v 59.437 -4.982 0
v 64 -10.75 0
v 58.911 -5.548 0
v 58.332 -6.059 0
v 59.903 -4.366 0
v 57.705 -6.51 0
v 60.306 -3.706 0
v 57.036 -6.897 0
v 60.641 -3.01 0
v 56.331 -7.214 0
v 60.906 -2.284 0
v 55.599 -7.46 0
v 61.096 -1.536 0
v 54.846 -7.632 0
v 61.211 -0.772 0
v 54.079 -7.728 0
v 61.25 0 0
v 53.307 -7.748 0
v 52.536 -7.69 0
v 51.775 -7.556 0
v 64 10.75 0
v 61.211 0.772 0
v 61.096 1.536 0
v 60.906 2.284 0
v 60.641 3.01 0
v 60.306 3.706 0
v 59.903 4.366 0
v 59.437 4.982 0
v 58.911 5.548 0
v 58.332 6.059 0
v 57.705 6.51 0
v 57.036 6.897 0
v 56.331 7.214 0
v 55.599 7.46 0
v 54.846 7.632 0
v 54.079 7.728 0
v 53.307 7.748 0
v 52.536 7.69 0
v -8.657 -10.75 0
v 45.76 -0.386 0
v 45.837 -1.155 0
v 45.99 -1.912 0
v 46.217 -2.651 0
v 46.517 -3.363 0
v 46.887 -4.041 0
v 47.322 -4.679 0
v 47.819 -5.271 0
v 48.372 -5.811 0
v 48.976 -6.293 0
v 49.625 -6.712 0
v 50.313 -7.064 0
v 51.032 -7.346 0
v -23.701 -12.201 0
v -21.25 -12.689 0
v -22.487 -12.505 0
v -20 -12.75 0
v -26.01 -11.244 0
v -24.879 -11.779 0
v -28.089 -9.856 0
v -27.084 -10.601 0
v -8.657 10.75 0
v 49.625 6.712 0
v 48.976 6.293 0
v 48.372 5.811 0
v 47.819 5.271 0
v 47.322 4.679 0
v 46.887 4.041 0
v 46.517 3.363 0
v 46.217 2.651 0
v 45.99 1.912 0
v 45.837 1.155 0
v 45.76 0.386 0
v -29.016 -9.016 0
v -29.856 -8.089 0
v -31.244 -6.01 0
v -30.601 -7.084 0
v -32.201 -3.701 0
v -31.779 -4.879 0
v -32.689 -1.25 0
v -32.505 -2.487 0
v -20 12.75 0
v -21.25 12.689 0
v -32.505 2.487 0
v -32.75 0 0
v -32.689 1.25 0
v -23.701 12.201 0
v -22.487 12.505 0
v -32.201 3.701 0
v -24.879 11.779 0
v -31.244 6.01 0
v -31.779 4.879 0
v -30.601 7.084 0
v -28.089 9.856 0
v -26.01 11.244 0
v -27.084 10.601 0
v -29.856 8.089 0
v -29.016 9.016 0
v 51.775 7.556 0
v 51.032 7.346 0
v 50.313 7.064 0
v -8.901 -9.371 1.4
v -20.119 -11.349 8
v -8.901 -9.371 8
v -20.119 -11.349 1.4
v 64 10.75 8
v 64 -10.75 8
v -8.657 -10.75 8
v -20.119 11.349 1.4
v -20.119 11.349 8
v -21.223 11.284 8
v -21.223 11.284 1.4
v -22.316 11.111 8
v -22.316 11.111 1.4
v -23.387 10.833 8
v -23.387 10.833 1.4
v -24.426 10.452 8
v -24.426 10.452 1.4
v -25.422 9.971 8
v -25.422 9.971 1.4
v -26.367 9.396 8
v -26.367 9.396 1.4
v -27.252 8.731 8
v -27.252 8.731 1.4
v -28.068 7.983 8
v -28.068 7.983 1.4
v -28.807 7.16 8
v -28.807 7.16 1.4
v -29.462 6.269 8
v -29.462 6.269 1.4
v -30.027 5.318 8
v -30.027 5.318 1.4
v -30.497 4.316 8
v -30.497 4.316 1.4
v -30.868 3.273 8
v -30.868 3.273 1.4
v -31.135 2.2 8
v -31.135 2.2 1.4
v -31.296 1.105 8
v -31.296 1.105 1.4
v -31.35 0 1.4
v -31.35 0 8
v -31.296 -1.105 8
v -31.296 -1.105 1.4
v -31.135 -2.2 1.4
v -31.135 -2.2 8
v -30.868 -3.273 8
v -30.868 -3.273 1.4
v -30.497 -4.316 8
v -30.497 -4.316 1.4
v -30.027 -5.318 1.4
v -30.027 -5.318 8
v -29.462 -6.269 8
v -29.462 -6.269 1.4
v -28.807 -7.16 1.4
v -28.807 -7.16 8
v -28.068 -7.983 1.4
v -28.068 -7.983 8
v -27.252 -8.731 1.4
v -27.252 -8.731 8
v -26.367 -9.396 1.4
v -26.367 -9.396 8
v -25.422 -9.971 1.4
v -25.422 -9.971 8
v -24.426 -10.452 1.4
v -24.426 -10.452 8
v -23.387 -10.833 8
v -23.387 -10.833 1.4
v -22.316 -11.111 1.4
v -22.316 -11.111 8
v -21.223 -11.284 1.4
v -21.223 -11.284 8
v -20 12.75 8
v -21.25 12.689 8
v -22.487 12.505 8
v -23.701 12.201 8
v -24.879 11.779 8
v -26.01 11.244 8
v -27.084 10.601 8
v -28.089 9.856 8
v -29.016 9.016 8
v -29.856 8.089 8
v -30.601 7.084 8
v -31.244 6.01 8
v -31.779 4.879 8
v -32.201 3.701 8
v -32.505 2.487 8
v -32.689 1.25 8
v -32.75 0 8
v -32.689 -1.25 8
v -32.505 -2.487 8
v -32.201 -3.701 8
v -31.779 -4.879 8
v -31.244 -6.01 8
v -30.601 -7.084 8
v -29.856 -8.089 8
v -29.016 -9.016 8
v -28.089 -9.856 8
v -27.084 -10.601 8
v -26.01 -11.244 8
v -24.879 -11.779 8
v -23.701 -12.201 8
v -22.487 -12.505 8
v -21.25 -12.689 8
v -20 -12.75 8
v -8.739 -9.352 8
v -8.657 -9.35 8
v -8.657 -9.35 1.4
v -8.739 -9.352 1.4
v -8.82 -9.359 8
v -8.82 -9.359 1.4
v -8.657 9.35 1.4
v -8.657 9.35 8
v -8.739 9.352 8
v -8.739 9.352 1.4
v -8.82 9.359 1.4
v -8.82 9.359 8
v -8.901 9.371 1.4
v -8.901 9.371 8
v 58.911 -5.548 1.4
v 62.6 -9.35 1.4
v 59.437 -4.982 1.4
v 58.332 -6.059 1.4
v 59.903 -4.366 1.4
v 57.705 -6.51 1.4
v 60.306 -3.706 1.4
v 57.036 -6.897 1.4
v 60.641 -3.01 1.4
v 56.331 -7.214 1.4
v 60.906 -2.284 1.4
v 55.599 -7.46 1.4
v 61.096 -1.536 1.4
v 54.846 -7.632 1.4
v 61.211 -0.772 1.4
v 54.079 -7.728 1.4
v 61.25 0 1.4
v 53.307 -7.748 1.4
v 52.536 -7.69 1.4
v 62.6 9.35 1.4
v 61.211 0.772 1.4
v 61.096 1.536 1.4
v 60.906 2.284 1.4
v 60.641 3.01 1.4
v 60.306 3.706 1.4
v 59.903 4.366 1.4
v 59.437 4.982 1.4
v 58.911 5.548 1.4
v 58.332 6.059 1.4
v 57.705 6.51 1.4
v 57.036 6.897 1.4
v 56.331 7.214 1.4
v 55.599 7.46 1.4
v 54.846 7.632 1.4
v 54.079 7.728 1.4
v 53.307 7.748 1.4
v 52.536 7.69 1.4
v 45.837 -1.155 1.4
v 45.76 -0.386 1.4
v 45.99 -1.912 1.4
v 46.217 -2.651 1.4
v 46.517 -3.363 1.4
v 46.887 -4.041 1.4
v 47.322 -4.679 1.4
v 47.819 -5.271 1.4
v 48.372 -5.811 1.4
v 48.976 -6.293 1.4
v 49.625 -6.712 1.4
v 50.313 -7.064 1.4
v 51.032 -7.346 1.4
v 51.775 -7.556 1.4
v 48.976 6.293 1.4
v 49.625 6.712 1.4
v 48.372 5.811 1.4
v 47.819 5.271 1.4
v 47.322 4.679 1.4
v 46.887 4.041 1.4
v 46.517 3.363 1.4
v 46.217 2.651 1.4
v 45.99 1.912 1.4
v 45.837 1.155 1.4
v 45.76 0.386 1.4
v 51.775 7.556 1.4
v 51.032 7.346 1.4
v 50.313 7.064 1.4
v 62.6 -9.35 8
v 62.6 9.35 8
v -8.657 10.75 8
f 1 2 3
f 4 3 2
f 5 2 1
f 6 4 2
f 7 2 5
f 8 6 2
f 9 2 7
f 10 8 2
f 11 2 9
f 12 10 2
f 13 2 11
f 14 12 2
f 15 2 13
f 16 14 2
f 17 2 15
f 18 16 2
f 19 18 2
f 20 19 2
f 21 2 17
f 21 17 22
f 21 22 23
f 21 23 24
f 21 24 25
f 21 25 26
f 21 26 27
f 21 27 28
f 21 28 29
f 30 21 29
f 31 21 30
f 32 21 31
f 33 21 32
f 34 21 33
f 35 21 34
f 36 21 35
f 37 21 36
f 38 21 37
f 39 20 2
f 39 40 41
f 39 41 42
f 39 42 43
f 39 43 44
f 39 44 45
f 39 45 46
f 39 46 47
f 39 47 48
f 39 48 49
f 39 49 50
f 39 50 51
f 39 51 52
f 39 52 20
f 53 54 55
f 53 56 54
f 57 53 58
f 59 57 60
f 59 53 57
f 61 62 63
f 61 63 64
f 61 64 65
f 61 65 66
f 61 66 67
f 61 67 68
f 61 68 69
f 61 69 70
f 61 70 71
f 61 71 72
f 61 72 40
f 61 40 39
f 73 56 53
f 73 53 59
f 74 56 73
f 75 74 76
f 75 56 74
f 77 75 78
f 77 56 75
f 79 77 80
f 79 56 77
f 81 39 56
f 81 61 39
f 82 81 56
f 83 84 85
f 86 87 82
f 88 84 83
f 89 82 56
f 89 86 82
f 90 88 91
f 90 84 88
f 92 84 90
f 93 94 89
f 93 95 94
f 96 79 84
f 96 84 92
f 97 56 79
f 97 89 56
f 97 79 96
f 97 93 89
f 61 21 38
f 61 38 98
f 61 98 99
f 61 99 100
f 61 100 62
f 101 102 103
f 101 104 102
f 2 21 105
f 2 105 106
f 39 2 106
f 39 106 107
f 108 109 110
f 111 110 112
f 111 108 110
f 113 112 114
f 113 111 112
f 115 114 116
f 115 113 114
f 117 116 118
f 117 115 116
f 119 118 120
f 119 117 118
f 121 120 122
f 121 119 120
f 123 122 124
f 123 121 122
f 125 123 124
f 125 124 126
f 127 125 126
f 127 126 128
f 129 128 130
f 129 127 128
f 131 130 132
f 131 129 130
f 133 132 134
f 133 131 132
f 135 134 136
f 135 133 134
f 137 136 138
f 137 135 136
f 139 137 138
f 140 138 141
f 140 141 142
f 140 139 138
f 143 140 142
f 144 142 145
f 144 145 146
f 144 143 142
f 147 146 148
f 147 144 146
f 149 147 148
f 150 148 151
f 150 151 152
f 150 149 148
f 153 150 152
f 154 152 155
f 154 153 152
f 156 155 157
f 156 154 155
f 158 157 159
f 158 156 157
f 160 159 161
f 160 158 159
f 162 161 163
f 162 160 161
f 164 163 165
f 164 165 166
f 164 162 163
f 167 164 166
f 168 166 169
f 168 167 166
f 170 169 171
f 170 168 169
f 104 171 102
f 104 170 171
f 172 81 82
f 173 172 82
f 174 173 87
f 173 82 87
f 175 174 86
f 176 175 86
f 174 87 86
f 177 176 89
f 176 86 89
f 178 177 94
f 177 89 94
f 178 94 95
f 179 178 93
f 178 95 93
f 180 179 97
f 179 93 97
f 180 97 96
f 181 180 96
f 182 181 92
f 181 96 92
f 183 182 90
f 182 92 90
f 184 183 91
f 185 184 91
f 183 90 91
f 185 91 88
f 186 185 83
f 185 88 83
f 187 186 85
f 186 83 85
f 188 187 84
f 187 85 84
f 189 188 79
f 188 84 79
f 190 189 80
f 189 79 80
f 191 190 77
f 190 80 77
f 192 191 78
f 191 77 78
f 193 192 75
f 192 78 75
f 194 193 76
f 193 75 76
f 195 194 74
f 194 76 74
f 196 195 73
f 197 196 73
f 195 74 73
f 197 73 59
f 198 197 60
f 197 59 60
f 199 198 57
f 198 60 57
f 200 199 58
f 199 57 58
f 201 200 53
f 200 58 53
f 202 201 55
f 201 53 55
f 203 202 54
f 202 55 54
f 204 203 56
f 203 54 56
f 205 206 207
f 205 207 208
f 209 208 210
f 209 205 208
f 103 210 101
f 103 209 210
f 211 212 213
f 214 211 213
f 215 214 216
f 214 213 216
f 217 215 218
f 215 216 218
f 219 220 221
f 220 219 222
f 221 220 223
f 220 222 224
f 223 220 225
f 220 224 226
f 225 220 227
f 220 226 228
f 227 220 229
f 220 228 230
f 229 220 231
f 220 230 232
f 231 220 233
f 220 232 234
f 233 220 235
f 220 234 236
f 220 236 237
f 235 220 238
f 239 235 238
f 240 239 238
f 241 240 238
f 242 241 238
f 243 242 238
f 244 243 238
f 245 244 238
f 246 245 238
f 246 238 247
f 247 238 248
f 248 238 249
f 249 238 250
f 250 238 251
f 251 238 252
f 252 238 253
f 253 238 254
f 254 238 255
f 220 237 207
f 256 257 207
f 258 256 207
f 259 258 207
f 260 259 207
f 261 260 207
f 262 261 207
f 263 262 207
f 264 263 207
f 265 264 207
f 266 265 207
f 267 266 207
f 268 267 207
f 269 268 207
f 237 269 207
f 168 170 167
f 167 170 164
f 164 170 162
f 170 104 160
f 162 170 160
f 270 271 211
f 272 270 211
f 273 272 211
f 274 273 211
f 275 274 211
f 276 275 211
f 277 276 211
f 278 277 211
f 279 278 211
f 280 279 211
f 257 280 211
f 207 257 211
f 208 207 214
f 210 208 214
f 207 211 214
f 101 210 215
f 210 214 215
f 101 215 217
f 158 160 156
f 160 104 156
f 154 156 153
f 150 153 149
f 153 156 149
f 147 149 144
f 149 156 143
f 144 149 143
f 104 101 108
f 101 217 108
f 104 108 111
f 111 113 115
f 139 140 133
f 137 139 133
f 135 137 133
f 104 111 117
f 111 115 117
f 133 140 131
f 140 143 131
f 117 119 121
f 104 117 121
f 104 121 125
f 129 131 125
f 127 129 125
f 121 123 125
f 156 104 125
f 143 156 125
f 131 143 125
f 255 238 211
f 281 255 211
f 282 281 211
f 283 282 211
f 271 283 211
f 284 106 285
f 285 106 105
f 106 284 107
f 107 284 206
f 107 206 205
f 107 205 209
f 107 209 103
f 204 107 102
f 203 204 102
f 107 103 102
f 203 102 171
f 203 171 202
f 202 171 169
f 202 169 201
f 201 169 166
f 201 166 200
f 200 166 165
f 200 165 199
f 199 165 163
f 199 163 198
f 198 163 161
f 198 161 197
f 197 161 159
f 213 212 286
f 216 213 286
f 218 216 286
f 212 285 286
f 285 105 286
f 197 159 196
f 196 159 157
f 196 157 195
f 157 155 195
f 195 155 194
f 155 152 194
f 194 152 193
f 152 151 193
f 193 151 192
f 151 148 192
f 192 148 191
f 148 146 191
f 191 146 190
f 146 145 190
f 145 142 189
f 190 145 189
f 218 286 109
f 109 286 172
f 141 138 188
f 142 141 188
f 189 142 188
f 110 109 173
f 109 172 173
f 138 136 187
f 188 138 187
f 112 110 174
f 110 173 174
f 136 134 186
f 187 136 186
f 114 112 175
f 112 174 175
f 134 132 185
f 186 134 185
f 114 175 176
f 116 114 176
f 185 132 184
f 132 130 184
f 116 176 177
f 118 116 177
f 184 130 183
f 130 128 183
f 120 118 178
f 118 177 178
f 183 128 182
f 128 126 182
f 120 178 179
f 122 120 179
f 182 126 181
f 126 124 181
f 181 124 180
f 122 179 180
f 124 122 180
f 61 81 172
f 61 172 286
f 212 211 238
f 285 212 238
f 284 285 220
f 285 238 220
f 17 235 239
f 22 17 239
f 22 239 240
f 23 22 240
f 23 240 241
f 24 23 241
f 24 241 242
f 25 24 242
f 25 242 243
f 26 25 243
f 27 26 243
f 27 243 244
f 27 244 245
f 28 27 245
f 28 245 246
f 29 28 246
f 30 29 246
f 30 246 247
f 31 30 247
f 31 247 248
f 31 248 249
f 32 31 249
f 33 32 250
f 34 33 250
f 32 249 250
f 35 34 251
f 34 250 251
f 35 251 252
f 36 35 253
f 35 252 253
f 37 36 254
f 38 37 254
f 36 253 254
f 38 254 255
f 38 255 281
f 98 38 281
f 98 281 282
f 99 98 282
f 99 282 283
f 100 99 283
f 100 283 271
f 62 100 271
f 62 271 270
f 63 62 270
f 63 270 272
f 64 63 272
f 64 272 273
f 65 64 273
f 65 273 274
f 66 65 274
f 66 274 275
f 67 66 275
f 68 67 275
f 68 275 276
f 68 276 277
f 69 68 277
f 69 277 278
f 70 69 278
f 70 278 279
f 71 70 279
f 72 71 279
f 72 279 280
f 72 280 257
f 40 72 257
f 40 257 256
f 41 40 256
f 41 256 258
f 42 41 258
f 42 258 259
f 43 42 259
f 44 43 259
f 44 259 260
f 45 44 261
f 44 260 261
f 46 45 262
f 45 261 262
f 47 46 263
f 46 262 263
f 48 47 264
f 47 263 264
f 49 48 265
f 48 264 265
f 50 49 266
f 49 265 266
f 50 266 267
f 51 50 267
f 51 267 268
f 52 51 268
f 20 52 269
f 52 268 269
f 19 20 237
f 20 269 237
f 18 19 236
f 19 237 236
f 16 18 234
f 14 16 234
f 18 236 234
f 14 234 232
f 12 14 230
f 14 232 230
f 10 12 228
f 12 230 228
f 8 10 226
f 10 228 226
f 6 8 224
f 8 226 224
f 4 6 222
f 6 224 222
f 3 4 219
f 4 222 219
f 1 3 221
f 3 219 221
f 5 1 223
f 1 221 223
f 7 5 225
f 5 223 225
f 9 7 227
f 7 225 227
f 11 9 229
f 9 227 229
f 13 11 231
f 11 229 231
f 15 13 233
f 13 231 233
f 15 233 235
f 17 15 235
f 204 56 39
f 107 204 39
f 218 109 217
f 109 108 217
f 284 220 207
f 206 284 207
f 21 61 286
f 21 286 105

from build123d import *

# Parameters (mm, degrees)
PAD009_DEPTH    = 8
THICKNESS_T     = -1.4
SKETCH017_R     = 7.75
POCKET006_DEPTH = 1.401


with BuildPart() as part:
    # Sketch016 → Pad009 (new body)
    with BuildSketch(Plane.XY):
        with BuildLine():
            Line((-8.657434, 10.75), (64, 10.75))
            Line((64, 10.75), (64, -10.75))
            Line((64, -10.75), (-8.657434, -10.75))
            Line((-19.999998, -12.75), (-8.657434, -10.75))
            ThreePointArc((-19.999998, 12.75), (-32.75, 0), (-19.999998, -12.75))
            Line((-19.999998, 12.75), (-8.657434, 10.75))
        make_face()
    extrude(amount=PAD009_DEPTH)

    # Thickness
    thickness_openings = [part.faces().sort_by_distance(p)[0] for p in [
        (15.774779, 0, 8),
    ]]
    offset(amount=THICKNESS_T, openings=thickness_openings)

    # Sketch017 (on Face17 of Thickness) → Pocket006 (cut, through all)
    with BuildSketch(Plane.XY.offset(1.4)):
        with Locations((53.5, 0)):
            Circle(SKETCH017_R)
    extrude(amount=-POCKET006_DEPTH, mode=Mode.SUBTRACT)


solid = part.part
